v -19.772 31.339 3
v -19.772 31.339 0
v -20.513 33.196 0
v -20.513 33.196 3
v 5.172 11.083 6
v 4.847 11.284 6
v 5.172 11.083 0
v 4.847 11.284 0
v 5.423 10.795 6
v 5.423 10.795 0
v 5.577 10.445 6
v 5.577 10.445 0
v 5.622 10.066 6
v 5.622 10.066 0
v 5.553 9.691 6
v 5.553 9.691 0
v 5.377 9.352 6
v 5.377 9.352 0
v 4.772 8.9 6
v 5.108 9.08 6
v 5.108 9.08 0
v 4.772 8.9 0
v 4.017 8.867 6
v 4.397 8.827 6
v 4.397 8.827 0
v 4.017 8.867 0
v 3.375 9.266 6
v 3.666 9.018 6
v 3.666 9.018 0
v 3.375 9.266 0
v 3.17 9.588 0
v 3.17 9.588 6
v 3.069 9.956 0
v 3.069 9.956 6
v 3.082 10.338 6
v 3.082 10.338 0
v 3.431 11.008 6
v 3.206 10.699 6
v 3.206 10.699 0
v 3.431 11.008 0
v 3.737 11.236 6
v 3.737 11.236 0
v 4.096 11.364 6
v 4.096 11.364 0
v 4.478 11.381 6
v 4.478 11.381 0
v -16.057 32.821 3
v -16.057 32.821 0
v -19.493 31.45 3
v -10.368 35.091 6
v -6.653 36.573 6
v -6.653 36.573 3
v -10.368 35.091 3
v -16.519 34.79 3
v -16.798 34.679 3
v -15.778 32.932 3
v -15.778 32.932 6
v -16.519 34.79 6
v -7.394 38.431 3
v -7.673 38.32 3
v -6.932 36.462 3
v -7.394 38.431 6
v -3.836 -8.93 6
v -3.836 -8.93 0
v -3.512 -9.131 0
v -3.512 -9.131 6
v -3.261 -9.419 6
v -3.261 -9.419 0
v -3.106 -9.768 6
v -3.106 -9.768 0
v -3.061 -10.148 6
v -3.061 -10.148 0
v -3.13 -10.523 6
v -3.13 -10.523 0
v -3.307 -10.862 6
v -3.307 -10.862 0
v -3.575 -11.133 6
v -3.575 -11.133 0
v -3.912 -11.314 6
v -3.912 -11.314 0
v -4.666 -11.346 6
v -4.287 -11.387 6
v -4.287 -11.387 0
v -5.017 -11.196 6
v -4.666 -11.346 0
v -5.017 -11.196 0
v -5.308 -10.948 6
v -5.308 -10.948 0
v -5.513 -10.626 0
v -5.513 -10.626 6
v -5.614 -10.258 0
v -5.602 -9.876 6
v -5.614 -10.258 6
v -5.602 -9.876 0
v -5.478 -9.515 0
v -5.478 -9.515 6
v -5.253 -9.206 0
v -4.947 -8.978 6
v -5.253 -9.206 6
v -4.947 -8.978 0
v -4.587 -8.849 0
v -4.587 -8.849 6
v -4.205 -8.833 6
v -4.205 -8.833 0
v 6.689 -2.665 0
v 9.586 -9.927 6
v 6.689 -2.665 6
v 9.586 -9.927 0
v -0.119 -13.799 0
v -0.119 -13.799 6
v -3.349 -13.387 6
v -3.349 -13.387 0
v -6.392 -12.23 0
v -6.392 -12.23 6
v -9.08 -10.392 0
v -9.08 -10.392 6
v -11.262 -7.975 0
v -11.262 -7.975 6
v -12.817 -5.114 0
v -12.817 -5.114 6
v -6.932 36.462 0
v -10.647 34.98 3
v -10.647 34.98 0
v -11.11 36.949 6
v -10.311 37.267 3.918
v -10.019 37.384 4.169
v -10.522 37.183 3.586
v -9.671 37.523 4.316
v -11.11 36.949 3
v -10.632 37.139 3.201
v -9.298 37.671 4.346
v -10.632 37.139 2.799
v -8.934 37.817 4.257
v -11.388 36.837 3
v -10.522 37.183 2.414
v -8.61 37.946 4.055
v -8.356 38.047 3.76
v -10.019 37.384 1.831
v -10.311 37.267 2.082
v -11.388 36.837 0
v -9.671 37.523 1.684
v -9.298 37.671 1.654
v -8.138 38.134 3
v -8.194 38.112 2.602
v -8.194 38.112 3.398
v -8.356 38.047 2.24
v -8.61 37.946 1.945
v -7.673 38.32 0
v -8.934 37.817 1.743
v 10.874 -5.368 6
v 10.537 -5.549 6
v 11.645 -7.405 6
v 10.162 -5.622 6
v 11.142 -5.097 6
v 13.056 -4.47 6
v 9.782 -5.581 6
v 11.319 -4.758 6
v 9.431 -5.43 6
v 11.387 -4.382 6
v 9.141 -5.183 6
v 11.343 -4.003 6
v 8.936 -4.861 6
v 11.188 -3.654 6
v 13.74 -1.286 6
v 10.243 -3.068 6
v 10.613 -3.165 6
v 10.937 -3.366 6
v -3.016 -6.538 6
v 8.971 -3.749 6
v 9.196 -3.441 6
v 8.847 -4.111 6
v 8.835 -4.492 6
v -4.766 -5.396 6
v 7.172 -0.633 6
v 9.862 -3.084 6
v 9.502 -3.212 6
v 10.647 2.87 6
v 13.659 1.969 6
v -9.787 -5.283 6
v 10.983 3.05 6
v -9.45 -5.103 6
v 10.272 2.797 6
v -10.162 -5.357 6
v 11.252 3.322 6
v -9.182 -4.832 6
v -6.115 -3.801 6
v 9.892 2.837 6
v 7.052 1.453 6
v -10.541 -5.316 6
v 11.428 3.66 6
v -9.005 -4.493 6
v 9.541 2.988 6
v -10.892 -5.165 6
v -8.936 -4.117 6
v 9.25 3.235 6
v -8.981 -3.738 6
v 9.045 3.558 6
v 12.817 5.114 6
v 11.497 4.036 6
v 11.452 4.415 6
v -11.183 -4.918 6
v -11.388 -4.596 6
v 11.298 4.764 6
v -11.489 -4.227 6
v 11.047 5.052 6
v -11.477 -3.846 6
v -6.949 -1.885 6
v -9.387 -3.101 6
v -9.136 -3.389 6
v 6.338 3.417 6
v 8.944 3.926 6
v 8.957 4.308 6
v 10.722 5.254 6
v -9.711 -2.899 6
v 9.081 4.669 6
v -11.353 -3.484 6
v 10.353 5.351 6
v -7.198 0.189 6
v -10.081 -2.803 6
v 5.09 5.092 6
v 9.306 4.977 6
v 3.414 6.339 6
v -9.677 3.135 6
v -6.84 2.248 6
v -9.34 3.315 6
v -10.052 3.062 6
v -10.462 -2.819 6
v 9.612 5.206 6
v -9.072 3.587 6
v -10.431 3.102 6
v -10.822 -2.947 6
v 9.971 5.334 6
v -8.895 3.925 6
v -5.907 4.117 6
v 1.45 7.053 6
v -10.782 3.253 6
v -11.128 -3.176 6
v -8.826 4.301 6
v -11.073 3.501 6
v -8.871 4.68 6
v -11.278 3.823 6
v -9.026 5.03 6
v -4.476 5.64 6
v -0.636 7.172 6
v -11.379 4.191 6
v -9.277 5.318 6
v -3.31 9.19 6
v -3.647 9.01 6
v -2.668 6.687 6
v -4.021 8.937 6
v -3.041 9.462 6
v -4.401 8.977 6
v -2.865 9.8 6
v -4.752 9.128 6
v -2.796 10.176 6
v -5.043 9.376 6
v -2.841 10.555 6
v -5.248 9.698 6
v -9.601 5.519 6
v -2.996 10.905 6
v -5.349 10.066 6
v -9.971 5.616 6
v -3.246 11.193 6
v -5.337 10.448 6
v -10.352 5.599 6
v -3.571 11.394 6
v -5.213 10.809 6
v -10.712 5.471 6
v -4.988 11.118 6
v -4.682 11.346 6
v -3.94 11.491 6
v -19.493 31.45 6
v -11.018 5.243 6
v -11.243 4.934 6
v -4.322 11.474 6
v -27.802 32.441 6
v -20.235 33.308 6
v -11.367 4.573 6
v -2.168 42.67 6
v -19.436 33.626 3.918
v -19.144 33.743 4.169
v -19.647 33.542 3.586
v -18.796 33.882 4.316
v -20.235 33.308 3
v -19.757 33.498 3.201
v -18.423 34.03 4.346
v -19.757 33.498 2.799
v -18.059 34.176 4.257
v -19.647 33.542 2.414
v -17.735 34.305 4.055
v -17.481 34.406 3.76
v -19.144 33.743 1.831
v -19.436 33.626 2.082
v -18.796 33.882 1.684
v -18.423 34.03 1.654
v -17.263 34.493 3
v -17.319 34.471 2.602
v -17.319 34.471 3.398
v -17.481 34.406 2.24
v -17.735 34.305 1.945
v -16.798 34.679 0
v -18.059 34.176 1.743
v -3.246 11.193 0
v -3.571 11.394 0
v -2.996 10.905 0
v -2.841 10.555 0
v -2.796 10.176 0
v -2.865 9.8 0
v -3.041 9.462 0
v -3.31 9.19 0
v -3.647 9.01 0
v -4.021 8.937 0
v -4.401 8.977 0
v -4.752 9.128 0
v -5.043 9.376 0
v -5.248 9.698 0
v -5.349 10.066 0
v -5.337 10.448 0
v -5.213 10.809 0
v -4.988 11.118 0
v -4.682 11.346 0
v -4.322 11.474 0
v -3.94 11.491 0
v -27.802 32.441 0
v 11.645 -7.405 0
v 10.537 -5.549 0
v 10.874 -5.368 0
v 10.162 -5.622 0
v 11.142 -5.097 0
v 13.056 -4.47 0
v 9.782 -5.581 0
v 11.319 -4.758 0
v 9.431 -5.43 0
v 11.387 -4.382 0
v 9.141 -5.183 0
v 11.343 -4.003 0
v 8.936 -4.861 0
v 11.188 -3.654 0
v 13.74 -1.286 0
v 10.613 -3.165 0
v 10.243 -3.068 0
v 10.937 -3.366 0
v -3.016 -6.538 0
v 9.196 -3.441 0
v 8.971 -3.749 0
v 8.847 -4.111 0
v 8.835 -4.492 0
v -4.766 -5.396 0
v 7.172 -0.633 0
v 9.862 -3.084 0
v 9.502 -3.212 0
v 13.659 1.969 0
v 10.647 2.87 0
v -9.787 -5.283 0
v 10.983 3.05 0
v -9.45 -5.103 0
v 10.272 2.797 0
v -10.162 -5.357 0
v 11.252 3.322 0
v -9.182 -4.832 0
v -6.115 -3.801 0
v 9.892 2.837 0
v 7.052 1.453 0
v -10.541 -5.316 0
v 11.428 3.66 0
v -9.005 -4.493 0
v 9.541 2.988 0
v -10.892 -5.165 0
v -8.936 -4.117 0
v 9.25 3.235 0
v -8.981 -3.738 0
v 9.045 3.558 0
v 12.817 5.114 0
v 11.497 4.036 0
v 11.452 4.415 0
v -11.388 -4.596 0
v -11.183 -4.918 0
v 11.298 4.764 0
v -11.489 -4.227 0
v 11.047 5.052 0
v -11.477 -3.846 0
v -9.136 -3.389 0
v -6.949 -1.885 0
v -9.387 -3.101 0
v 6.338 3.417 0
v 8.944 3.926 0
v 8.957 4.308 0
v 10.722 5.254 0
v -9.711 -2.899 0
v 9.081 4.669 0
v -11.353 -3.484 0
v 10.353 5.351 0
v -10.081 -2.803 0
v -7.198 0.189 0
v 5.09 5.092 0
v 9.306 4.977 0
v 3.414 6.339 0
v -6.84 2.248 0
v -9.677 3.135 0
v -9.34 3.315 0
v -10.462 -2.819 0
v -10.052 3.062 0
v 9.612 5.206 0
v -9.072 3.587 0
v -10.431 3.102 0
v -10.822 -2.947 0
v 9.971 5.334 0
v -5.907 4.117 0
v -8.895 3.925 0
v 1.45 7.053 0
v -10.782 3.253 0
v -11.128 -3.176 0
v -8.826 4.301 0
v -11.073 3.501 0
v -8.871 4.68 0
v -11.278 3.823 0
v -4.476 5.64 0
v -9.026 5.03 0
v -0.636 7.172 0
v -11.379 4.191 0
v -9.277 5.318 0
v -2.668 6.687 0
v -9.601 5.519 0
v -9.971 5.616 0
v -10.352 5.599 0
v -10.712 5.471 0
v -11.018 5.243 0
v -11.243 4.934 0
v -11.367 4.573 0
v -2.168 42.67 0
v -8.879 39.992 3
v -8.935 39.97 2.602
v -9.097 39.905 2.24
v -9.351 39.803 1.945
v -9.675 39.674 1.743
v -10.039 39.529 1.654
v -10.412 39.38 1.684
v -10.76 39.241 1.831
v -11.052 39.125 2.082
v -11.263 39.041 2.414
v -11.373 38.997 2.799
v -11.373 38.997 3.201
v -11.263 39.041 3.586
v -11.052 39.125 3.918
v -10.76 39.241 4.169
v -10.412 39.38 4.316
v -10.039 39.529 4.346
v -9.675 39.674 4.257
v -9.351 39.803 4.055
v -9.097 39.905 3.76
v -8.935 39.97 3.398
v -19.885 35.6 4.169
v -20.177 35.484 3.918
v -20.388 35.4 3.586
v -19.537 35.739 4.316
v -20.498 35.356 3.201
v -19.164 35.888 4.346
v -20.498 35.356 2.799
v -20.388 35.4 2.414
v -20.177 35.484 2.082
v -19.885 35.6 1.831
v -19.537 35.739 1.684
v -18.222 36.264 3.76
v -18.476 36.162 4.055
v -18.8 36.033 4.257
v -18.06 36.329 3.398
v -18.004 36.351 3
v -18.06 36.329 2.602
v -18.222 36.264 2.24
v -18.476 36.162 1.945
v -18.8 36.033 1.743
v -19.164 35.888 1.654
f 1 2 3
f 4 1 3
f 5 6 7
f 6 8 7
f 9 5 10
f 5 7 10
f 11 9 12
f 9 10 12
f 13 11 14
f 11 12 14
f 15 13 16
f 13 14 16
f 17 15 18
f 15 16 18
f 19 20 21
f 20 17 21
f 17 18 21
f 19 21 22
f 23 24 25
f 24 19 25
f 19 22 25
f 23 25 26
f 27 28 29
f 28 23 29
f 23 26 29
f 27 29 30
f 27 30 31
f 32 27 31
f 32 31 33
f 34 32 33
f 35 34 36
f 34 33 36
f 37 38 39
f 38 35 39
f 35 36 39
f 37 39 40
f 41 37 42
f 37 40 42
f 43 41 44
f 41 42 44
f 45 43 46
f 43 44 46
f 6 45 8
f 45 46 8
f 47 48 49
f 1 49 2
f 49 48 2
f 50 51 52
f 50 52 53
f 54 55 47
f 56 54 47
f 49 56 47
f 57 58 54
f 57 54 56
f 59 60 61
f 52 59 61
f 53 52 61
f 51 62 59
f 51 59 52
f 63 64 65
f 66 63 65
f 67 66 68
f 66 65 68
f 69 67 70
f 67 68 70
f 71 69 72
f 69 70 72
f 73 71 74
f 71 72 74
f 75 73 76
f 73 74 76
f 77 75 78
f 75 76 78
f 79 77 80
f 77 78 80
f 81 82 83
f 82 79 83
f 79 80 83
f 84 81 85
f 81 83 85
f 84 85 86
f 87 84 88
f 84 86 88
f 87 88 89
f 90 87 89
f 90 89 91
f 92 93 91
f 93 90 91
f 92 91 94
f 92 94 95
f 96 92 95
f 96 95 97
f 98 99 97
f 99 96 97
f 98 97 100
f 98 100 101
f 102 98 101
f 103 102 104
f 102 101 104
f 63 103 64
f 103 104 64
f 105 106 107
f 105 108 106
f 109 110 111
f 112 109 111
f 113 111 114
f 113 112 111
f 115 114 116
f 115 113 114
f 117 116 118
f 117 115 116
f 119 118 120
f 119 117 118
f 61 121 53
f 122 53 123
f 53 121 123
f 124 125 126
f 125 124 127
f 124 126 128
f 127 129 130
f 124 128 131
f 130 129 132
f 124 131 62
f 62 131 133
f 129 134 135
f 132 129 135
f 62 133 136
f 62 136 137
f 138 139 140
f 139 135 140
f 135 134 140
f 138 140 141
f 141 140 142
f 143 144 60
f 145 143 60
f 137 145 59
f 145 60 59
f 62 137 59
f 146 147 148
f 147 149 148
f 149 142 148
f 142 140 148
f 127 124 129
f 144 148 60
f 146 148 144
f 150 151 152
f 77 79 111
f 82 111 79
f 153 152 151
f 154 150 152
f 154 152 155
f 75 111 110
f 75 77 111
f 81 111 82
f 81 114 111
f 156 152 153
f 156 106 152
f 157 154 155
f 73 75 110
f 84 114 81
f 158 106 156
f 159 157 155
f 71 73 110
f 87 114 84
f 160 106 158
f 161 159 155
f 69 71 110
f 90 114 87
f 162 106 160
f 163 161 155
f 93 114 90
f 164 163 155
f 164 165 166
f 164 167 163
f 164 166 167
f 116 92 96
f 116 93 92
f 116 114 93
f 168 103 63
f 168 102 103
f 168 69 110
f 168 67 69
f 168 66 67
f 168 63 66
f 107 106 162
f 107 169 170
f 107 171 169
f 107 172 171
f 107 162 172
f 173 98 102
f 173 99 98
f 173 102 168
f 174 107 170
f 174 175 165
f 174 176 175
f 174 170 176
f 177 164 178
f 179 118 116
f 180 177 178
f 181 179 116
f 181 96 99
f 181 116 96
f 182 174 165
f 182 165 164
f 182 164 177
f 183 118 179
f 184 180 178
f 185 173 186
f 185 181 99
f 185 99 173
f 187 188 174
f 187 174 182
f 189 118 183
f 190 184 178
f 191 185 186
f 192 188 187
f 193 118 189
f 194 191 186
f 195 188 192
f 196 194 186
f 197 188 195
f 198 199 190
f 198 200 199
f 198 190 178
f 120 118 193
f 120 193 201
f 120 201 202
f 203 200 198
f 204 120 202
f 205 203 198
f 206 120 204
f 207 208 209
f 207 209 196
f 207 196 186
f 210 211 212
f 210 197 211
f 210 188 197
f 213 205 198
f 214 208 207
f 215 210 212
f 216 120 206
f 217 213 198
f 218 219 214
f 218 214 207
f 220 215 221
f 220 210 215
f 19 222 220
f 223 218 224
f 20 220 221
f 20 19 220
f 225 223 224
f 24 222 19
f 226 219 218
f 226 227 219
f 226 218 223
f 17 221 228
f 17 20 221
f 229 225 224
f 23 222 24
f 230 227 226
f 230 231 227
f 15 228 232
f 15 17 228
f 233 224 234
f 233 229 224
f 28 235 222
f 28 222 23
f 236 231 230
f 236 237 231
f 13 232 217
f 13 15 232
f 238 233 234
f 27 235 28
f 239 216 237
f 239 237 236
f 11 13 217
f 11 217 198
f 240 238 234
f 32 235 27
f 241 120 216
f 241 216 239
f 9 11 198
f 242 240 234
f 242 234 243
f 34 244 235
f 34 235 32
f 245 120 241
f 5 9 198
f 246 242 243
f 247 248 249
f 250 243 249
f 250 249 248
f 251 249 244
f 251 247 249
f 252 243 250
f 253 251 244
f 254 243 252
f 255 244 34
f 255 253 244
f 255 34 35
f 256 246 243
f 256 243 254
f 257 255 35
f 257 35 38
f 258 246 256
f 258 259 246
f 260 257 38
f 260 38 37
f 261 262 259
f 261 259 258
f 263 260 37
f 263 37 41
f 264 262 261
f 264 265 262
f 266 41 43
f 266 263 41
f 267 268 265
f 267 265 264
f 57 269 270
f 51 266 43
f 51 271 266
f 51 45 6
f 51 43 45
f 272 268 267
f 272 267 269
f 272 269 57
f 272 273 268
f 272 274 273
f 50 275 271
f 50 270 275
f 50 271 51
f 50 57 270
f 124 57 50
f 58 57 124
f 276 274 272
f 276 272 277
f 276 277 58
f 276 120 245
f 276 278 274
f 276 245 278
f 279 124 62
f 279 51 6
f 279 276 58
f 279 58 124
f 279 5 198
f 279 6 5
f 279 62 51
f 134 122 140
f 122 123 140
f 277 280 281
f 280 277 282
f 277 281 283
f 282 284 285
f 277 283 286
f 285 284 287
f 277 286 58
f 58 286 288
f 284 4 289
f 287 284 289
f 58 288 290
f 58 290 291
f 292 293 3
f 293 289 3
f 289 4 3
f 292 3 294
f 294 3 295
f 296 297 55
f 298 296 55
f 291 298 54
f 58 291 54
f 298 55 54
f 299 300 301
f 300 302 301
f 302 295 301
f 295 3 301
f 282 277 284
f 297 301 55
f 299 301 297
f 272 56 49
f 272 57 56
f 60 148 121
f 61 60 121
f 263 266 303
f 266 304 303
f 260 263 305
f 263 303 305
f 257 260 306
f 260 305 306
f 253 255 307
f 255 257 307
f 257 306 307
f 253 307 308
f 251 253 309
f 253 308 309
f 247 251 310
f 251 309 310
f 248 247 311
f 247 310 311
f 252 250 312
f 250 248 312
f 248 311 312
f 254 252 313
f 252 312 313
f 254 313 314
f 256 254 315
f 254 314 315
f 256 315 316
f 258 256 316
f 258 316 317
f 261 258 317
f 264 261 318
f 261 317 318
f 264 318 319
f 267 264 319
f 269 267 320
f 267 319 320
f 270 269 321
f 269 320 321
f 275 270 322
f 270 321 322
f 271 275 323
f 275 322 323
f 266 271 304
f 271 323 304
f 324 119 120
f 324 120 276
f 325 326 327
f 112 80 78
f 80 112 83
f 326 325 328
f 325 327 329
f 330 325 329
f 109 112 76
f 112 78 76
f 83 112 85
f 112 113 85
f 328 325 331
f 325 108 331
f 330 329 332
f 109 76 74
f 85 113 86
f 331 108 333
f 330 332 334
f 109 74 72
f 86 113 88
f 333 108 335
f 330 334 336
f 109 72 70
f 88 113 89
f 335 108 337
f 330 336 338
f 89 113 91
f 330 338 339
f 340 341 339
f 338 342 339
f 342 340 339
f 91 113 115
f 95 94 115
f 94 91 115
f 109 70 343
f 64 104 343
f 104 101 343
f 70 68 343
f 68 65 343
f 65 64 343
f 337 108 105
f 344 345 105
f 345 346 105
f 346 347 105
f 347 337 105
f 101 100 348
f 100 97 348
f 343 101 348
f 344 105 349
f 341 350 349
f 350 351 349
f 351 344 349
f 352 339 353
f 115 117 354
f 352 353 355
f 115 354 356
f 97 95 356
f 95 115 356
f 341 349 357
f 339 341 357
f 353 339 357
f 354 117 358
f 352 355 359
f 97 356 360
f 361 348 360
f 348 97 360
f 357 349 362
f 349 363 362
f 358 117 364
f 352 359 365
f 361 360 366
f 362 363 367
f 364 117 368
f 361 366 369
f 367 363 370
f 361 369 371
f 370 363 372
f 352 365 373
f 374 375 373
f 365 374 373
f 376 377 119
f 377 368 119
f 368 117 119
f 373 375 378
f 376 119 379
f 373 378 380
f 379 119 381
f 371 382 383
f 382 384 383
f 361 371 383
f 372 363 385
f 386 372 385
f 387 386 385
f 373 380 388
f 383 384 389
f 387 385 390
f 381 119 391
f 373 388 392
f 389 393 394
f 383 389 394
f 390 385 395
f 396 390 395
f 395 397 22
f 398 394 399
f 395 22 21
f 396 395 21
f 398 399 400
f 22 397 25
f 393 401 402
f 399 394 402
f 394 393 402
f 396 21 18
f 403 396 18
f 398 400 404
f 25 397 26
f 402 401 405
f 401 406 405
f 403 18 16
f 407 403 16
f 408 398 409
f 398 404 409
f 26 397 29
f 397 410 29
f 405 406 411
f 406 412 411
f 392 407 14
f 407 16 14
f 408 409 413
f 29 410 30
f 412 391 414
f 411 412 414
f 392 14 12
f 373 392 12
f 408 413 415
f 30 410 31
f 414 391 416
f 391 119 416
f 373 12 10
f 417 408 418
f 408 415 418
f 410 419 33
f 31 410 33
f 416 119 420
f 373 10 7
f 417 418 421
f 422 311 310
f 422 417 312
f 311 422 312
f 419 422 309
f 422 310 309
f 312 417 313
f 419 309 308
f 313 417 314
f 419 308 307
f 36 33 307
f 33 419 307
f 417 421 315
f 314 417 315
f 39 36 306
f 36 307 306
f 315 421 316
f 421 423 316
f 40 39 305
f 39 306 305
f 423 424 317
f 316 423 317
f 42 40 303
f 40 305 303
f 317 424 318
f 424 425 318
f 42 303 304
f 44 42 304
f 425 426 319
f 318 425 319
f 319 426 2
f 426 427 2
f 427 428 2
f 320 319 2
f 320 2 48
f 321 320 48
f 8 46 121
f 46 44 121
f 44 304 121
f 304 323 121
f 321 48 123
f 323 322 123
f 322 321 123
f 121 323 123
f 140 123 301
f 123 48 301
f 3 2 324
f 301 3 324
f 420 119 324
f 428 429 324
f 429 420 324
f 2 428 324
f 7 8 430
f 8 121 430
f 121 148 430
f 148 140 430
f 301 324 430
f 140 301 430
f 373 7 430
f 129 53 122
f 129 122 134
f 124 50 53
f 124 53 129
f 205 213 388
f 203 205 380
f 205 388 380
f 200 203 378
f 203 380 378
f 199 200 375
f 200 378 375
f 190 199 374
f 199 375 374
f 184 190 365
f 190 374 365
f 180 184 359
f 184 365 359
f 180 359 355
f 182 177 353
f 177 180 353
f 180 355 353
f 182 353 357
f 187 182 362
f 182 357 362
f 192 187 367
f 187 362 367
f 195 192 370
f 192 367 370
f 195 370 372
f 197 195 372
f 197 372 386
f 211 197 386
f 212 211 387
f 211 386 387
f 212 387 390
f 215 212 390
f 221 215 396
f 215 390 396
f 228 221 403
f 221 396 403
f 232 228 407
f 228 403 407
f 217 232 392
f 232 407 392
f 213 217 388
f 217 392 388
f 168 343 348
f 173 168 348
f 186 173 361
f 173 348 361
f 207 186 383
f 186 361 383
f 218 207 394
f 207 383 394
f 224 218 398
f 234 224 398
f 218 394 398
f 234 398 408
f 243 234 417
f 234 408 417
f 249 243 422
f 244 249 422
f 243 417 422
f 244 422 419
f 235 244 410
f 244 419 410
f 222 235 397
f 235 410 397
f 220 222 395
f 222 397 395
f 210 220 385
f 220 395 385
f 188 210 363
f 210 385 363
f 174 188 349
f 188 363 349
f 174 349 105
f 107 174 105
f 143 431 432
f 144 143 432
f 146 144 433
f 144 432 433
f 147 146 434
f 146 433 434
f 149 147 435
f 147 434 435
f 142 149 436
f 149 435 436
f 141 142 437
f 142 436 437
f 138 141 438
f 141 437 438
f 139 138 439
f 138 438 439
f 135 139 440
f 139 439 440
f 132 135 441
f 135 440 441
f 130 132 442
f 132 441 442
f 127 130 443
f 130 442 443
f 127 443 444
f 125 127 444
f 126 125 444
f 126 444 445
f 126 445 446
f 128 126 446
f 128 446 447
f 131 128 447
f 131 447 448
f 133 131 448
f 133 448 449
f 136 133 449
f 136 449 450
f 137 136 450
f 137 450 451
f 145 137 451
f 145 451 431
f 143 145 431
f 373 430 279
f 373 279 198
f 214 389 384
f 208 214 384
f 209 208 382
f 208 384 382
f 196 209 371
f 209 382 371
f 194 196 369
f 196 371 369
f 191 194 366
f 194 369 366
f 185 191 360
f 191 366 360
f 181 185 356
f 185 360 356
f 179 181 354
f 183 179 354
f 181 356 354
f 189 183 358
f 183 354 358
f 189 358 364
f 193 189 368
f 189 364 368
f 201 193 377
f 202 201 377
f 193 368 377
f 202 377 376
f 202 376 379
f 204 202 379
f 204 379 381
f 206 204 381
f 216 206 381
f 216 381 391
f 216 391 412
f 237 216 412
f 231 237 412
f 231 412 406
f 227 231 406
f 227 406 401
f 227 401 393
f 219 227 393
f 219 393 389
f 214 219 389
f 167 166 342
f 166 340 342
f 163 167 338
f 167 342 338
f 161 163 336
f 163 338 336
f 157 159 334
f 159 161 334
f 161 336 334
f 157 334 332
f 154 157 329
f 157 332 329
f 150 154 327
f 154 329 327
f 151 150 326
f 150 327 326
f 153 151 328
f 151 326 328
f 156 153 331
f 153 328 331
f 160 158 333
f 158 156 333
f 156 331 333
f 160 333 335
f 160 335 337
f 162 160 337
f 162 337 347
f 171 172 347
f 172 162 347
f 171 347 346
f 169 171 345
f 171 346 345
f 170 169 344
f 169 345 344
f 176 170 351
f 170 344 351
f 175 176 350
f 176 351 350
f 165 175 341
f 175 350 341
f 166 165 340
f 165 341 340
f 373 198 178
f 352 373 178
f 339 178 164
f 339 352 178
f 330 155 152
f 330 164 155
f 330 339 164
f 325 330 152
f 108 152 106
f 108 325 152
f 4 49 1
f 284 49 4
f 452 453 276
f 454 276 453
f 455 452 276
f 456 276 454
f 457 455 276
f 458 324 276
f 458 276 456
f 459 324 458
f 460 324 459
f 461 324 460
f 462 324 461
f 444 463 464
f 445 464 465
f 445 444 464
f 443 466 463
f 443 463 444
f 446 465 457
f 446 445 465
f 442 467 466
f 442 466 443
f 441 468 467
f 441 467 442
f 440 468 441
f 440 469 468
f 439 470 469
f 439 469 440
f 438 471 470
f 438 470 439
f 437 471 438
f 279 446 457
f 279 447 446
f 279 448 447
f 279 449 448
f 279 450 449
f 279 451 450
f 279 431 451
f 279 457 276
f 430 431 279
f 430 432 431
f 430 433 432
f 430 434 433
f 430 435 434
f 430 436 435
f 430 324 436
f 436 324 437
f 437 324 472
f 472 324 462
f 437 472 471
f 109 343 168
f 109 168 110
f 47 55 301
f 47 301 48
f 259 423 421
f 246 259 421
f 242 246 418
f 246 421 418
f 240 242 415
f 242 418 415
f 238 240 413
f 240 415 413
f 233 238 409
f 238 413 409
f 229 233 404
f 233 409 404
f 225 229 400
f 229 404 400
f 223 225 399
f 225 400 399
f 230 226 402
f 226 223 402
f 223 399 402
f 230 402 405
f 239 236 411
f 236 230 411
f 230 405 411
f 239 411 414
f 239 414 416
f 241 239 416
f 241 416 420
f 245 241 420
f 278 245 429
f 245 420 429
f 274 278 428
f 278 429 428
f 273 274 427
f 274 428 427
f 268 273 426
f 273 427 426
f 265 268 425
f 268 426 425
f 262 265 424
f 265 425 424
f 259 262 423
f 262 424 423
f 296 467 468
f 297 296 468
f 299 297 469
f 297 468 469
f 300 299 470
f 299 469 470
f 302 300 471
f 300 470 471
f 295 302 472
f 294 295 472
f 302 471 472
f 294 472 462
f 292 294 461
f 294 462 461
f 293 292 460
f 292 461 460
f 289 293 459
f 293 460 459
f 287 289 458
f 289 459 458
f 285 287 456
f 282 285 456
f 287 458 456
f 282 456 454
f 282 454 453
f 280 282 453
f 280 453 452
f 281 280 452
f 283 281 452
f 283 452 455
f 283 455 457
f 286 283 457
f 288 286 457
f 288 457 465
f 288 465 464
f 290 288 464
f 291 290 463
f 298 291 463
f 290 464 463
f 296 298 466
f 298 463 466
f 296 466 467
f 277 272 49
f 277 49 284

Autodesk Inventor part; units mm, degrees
ref_plane "YZ Plane" through (0, 0, 0) normal (1, 0, 0) x (0, 1, 0)
ref_plane "XZ Plane" through (0, 0, 0) normal (0, 1, 0) x (-1, 0, 0)
ref_plane "XY Plane" through (0, 0, 0) normal (0, 0, 1) x (1, 0, 0)
ref_plane "작업 평면1" through (0, 0, 0) normal (0, 0, 1) x (0.3947, 0.9188, 0)
sketch "스케치1" plane through (0, 0, 0) normal (0, 0, 1) x (0.3947, 0.9188, 0)
  point P0 (0, 0)
ref_plane "작업 평면2" through (0, 0, 0) normal (0, 0, 1) x (0.3947, 0.9188, 0)
sketch "스케치2" plane through (0, 0, 0) normal (0, 0, 1) x (0.3947, 0.9188, 0)
  circle A0 centre (0, 0) radius 13.8 projected
  circle A1 centre (0, 0) radius 7.2 projected
  circle A2 centre (0, -11) radius 1.2812 projected
  circle A3 centre (-7.7782, -7.7782) radius 1.2812 projected
  circle A4 centre (-11, 0) radius 1.2812 projected
  circle A5 centre (-7.7782, 7.7782) radius 1.2812 projected
  circle A6 centre (0, 11) radius 1.2812 projected
  circle A7 centre (7.7782, 7.7782) radius 1.2812 projected
  circle A8 centre (11, 0) radius 1.2812 projected
  circle A9 centre (7.7782, -7.7782) radius 1.2812 projected
  line L0 (33.63, -33.63) -> (-32.0037, 32.0037)
  circle A10 centre (0, 0) radius 4.75 projected
  circle A11 centre (0, 0) radius 5.2245
  line L1 (3.6943, -3.6943) -> (-3.6943, 3.6943)
  line L2 (-3.6943, 3.6943) -> (-13.4523, -6.0637)
  line L3 (-13.4523, -6.0637) -> (-6.0637, -13.4523)
  line L4 (-6.0637, -13.4523) -> (3.6943, -3.6943)
  line L5 (9.7581, -9.7581) -> (-9.7581, 9.7581)
  line L6 (-9.7581, 9.7581) -> (18.8336, 38.3497)
  line L7 (18.8336, 38.3497) -> (38.3497, 18.8336)
  line L8 (38.3497, 18.8336) -> (9.7581, -9.7581)
  point P0 (0, 0)
  point P1 (-12.726, -5.3374)
  point P2 (-7.1975, 0.1912)
  point P3 (0.1912, -7.1975)
  point P4 (-5.3374, -12.726)
extrude "돌출1" add sketch "스케치2" along normal blind 6 contours A0 L0 A9 A1 A5 | A0 L6 L7 L8 | L0 A5 A1 L2 A0 | A0 L4 A1 L0 A9
sketch "스케치3" plane through (-27.8029, 32.4408, 6) normal (-0.3706, 0.9288, 0) x (0.9288, 0.3706, 0)
  line L0 (27.6, 6) -> (27.6, 0) projected
  line L1 (27.6, 6) -> (18.4, 6)
  line L2 (21, 6) -> (6.6, 6) projected
  line L3 (18.4, 6) -> (9.2, 6)
  line L4 (19.0245, 6) -> (19.0245, 3)
  line L5 (19.0245, 6) -> (19.0245, 0) projected
  line L6 (9.2, 6) -> (9.2, 3)
  circle A0 centre (19.0245, 3) radius 1.35
  circle A1 centre (9.2, 3) radius 1.35
  point P0 (13.8, 6)
  point P1 (8.5755, 6)
  dimension "d2" = 9.2
  dimension "d3" = 9.2
  dimension "d4" = 3
  dimension "d5" = 3
  dimension "d6" = 2.7
  dimension "d7" = 2.7
extrude "돌출2" cut sketch "스케치3" against normal blind 3
sketch "스케치4" plane through (0, 0, 6) normal (0, 0, 1) x (0.9188, -0.3947, 0)
  line L0 (-23.7306, 29.2101) -> (-21.8214, 31.1192) projected
  line L1 (-30.6776, 22.2631) -> (-28.7684, 24.1722) projected
  line L2 (-23.7306, 29.2101) -> (-22.67, 30.2707)
  line L3 (-24.7913, 29.5636) -> (-21.9629, 32.392)
  line L4 (-21.9629, 32.392) -> (-20.5486, 30.9778)
  line L5 (-20.5486, 30.9778) -> (-23.3771, 28.1494)
  line L6 (-23.3771, 28.1494) -> (-24.7913, 29.5636)
  line L7 (-24.7913, 29.5636) -> (-20.5486, 30.9778) construction
  line L8 (-21.9629, 32.392) -> (-23.3771, 28.1494) construction
  line L9 (-30.6776, 22.2631) -> (-29.617, 23.3237)
  line L10 (-31.7383, 22.6166) -> (-28.9099, 25.445)
  line L11 (-28.9099, 25.445) -> (-27.4956, 24.0308)
  line L12 (-27.4956, 24.0308) -> (-30.3241, 21.2024)
  line L13 (-30.3241, 21.2024) -> (-31.7383, 22.6166)
  line L14 (-31.7383, 22.6166) -> (-27.4956, 24.0308) construction
  line L15 (-28.9099, 25.445) -> (-30.3241, 21.2024) construction
  point P0 (0, 0)
  dimension "d10" = 1.5
  dimension "d11" = 4
  dimension "d12" = 2
  dimension "d13" = 1.5
  dimension "d14" = 4
extrude "돌출3" cut sketch "스케치4" against normal blind 3
sketch "스케치5" plane through (0, 0, 0) normal (0, 0, -1) x (-0.9188, 0.3947, 0)
  line L0 (21.8214, 31.1192) -> (23.7306, 29.2101) projected
  line L1 (28.7684, 24.1722) -> (30.6776, 22.2631) projected
  line L2 (21.8214, 31.1192) -> (22.8821, 30.0586)
  line L3 (28.7684, 24.1722) -> (29.8291, 23.1116)
  line L4 (23.5892, 27.9373) -> (25.0034, 29.3515)
  line L5 (25.0034, 29.3515) -> (22.175, 32.1799)
  line L6 (22.175, 32.1799) -> (20.7608, 30.7657)
  line L7 (20.7608, 30.7657) -> (23.5892, 27.9373)
  line L8 (23.5892, 27.9373) -> (22.175, 32.1799) construction
  line L9 (25.0034, 29.3515) -> (20.7608, 30.7657) construction
  line L10 (30.5362, 20.9903) -> (31.9504, 22.4045)
  line L11 (31.9504, 22.4045) -> (29.122, 25.2329)
  line L12 (29.122, 25.2329) -> (27.7078, 23.8187)
  line L13 (27.7078, 23.8187) -> (30.5362, 20.9903)
  line L14 (30.5362, 20.9903) -> (29.122, 25.2329) construction
  line L15 (31.9504, 22.4045) -> (27.7078, 23.8187) construction
  point P0 (0, 0)
  dimension "d17" = 1.5
  dimension "d18" = 1.5
  dimension "d19" = 2
  dimension "d20" = 4
  dimension "d21" = 4
extrude "돌출4" cut sketch "스케치5" against normal blind 3
properties part number "_foot_adt"
